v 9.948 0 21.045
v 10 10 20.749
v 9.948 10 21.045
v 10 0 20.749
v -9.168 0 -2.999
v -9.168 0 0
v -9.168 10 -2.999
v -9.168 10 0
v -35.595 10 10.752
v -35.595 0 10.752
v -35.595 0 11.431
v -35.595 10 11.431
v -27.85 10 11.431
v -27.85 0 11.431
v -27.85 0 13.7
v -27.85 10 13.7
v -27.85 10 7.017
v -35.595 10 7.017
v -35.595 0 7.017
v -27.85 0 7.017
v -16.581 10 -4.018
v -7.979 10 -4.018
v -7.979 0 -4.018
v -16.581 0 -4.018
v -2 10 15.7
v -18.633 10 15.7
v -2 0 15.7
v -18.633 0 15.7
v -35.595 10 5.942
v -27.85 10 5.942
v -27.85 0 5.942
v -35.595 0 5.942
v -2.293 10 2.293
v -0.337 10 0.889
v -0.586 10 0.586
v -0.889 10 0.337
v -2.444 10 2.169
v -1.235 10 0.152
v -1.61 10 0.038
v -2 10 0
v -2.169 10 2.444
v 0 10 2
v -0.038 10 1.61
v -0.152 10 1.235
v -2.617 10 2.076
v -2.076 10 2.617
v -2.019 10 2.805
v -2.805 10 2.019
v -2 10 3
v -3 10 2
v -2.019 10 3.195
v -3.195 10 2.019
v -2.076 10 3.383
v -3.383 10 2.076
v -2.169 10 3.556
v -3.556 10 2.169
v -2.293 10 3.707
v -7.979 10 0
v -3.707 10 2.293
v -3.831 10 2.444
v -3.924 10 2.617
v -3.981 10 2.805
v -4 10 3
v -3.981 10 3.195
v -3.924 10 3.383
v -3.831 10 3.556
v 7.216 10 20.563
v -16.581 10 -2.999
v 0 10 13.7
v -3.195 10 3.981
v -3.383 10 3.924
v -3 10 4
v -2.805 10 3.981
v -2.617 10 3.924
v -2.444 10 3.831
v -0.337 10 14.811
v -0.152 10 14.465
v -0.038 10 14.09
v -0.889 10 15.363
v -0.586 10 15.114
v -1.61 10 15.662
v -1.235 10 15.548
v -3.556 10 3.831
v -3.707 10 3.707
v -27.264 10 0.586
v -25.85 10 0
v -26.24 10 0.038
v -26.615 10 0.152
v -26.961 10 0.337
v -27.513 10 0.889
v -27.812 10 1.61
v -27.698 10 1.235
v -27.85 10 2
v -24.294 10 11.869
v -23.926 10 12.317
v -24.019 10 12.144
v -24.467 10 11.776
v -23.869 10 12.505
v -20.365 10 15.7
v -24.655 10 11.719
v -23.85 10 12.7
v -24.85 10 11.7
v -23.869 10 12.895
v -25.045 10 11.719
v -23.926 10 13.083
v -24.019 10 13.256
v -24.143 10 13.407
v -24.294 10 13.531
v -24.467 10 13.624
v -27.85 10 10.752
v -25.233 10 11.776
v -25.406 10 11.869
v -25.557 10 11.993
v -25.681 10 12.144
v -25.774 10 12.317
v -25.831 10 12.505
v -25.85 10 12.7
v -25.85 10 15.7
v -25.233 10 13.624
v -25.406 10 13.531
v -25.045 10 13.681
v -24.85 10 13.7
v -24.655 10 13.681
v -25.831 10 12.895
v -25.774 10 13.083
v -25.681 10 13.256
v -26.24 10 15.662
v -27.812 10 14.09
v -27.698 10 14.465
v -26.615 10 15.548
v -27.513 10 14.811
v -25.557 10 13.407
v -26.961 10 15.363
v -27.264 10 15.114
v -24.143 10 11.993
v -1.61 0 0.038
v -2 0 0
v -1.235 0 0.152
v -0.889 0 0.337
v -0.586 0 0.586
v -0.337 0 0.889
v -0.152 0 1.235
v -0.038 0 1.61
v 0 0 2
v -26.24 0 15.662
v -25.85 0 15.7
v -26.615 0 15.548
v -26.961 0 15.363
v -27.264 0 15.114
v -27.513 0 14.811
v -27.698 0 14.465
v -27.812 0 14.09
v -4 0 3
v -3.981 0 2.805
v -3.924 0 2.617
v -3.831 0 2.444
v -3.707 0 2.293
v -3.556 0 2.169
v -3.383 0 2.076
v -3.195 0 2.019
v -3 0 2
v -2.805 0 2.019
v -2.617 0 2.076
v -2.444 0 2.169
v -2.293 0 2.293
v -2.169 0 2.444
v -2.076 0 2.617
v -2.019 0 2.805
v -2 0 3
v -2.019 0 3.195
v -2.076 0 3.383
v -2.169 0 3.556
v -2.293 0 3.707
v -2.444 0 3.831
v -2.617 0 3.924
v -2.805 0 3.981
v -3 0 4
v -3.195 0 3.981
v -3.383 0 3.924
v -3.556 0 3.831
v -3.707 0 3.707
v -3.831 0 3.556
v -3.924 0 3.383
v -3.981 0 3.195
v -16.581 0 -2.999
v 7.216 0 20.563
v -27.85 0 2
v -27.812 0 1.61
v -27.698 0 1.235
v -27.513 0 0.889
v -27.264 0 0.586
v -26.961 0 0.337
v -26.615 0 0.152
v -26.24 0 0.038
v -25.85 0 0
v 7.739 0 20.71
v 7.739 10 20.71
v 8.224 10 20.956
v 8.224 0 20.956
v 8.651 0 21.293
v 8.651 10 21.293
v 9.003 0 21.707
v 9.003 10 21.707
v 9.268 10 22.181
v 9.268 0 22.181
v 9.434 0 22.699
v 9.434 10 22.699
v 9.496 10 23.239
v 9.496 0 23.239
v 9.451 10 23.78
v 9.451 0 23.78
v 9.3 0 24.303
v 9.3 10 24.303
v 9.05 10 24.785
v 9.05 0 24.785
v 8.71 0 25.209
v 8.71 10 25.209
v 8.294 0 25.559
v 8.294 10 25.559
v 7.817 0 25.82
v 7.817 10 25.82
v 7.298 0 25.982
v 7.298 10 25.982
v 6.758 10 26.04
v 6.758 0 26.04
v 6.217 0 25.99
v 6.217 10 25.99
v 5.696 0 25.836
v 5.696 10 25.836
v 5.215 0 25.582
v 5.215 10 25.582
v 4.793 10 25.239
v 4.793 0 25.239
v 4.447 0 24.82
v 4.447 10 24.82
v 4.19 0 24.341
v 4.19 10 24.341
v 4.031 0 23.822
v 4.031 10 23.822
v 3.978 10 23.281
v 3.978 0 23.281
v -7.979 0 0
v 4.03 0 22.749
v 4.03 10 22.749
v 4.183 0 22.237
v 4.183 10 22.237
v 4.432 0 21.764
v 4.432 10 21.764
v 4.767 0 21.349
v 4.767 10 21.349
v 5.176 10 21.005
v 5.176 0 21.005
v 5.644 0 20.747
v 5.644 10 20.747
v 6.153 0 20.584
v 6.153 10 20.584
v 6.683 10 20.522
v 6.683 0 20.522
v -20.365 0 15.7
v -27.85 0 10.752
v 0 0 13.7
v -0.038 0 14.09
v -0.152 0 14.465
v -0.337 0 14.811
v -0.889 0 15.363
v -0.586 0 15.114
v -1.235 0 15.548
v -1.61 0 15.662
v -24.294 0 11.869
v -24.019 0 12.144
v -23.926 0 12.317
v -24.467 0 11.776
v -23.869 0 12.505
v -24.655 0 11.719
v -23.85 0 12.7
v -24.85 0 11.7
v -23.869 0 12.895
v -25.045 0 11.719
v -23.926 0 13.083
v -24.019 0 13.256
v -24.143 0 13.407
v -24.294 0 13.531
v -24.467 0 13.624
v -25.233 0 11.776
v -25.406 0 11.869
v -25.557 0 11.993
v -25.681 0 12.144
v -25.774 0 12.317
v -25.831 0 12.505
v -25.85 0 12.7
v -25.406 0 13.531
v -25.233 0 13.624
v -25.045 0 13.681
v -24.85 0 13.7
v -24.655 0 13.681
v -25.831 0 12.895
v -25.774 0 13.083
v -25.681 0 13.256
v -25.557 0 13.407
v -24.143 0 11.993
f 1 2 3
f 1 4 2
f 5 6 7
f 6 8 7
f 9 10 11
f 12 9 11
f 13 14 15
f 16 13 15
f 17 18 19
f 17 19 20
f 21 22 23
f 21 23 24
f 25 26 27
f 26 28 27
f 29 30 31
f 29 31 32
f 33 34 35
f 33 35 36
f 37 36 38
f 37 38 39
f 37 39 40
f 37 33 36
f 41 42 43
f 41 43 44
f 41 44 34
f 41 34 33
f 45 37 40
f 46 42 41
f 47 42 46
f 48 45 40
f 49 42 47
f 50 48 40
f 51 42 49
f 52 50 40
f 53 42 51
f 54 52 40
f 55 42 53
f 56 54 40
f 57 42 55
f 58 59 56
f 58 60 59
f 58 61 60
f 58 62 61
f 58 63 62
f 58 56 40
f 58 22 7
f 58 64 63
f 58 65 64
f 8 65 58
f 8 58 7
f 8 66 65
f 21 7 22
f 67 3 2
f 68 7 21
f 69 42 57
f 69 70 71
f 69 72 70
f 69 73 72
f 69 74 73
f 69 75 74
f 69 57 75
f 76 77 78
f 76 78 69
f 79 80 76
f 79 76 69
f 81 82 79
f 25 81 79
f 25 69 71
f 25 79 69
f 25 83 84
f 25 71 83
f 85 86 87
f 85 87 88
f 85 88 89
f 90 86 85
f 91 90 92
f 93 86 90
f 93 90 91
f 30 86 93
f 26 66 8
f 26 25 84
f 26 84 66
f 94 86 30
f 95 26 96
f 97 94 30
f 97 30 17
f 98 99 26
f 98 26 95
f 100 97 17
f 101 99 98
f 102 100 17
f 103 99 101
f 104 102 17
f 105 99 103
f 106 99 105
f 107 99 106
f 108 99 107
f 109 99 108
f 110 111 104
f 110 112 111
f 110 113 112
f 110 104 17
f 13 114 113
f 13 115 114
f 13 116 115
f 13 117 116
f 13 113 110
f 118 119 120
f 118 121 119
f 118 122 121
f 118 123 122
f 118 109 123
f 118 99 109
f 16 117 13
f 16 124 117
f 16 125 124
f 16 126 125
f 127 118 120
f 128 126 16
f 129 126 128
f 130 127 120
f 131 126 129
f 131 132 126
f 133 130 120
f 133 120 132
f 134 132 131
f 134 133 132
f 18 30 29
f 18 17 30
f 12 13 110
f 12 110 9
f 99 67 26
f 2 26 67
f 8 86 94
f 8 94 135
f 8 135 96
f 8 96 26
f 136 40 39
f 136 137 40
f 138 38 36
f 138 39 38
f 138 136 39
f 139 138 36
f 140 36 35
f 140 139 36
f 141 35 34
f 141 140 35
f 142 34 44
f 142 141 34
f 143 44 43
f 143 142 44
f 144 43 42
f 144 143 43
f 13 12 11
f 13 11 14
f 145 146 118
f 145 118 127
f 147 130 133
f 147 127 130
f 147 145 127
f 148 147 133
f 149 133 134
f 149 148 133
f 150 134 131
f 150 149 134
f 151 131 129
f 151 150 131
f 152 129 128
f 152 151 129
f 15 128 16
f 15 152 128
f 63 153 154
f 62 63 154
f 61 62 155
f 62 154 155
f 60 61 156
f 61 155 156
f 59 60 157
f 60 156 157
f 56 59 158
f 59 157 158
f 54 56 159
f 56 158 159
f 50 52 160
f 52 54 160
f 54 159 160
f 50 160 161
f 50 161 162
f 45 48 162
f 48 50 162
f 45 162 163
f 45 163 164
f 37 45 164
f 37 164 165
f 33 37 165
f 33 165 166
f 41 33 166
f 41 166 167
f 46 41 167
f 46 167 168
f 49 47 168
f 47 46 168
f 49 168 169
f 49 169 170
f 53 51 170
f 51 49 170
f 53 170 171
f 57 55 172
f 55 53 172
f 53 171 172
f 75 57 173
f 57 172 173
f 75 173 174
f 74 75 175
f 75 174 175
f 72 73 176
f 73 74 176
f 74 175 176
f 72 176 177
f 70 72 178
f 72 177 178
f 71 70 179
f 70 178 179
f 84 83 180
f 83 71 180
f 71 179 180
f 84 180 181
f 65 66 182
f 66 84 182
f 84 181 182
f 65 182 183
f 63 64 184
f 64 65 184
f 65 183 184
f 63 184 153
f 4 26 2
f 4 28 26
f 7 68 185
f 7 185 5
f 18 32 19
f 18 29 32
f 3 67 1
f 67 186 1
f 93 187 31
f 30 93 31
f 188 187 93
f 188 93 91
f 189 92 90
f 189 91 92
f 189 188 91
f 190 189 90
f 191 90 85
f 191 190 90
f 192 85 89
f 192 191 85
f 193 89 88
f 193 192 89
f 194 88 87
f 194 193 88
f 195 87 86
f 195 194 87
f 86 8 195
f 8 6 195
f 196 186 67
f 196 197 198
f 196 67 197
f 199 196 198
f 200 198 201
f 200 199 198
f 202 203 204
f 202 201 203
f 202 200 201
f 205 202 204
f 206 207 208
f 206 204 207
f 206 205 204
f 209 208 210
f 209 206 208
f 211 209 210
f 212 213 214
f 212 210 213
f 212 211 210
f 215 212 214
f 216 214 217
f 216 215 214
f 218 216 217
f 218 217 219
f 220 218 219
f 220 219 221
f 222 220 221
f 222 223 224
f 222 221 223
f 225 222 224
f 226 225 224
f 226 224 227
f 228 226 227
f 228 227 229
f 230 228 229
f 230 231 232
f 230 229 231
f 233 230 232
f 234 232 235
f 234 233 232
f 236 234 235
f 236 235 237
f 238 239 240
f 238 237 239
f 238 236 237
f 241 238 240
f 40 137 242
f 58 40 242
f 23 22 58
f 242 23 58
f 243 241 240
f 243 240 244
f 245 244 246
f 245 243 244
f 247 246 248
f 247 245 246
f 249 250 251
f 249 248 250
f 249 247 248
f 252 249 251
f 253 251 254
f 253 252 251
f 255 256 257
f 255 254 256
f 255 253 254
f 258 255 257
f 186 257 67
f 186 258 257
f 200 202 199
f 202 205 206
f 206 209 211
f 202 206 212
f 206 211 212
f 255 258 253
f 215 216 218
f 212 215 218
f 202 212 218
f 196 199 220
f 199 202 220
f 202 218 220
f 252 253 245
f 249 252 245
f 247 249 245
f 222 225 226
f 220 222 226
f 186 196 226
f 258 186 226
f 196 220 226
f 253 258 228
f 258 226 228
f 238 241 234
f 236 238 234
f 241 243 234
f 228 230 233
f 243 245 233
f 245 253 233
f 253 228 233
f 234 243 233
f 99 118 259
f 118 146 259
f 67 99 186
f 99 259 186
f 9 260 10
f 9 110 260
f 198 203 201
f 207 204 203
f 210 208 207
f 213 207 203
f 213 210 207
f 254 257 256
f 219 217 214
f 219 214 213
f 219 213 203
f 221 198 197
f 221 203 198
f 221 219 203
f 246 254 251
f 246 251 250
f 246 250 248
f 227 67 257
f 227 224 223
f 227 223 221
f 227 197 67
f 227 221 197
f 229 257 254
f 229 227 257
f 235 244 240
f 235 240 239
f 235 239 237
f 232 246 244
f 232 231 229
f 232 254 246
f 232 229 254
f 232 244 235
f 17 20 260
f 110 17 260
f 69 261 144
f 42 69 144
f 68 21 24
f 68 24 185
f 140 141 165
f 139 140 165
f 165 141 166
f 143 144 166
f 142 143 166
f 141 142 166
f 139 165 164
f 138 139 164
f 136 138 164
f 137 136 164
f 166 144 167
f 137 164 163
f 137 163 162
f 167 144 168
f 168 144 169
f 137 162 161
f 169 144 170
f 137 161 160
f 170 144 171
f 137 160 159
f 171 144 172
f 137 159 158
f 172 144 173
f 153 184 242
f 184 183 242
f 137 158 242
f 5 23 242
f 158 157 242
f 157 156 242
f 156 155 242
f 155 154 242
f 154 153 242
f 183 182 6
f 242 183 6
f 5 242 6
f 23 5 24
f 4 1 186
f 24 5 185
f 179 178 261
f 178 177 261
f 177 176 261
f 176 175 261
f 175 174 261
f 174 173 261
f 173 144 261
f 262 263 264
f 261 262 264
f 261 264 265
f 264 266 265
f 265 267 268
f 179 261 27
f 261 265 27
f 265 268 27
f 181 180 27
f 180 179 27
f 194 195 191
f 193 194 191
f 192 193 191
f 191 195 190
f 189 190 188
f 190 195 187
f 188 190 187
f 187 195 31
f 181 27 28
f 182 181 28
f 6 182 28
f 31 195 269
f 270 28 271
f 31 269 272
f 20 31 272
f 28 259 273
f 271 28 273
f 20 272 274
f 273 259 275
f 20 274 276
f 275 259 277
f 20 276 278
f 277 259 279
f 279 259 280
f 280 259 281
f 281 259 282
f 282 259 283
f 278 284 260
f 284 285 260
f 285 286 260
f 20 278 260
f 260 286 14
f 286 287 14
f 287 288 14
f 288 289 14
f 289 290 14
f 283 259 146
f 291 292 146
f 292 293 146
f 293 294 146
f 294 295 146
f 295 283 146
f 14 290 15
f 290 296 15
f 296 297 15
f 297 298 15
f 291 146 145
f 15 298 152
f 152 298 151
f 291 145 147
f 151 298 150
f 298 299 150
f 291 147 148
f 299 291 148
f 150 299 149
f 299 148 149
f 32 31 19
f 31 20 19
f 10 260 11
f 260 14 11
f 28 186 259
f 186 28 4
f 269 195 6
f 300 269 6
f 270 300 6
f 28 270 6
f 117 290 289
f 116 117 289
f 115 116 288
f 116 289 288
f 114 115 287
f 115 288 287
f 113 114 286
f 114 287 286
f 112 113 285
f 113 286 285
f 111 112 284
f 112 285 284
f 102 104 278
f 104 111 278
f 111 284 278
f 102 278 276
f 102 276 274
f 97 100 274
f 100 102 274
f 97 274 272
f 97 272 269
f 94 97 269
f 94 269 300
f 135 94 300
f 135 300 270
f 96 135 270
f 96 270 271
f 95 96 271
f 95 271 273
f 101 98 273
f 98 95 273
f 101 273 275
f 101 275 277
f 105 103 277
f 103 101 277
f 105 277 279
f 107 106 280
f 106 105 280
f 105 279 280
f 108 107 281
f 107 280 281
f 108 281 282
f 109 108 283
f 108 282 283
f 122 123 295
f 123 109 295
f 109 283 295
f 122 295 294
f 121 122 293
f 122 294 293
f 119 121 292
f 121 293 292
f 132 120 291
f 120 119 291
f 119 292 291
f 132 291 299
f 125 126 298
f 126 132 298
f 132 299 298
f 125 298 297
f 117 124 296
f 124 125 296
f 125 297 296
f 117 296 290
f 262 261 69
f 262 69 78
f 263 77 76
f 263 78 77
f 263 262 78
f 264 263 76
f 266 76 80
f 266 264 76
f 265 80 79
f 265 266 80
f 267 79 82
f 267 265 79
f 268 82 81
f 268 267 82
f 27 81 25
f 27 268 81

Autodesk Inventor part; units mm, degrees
ref_plane "YZ Plane" through (0, 0, 0) normal (1, 0, 0) x (0, 1, 0)
ref_plane "XZ Plane" through (0, 0, 0) normal (0, 1, 0) x (-1, 0, 0)
ref_plane "XY Plane" through (0, 0, 0) normal (0, 0, 1) x (1, 0, 0)
sketch "Sketch1" plane through (0, 0, 0) normal (0, 1, 0) x (-1, 0, 0)
  line L0 (2, 0) -> (25.85, 0)
  line L1 (27.85, 2) -> (27.85, 13.7)
  line L2 (25.85, 15.7) -> (2, 15.7)
  line L3 (0, 13.7) -> (0, 2)
  arc A0 (27.85, 13.7) -> (25.85, 15.7) centre (25.85, 13.7) ccw
  arc A1 (25.85, 0) -> (27.85, 2) centre (25.85, 2) ccw
  arc A2 (0, 2) -> (2, 0) centre (2, 2) ccw
  arc A3 (2, 15.7) -> (0, 13.7) centre (2, 13.7) ccw
  line L4 (20.3653, 15.7) -> (-9.9478, 21.045)
  line L5 (18.6331, 15.7) -> (-10, 20.7488)
  line L6 (-10, 20.7488) -> (-9.9478, 21.045)
  circle A4 centre (-6.737, 23.2807) radius 2.7592
  circle A5 centre (24.85, 12.7) radius 1
  circle A6 centre (3, 3) radius 1
  point P0 (0, 0)
  point P1 (27.85, 15.7)
  point P2 (27.85, 0)
  point P3 (0, 15.7)
  dimension "d0" = 27.85
  dimension "d1" = 15.7
  dimension "d2" = 2
  dimension "d5" = 170
  dimension "d6" = 10
  dimension "d7" = 2
  dimension "d8" = 2
  dimension "d9" = 3
  dimension "d10" = 3
  dimension "d11" = 3
  dimension "d12" = 3
extrude "Extrusion1" add sketch "Sketch1" along normal blind 10
sketch "Sketch2" plane through (0, 10, 0) normal (0, 1, 0) x (1, 0, 0)
  line L0 (-27.85, -2) -> (-27.85, -13.7) projected
  line L1 (-35.5947, -11.431) -> (-27.85, -11.431)
  line L2 (-27.85, -11.431) -> (-27.85, -10.752)
  line L3 (-27.85, -10.752) -> (-35.5947, -10.752)
  line L4 (-35.5947, -10.752) -> (-35.5947, -11.431)
  line L5 (-35.5947, -7.0171) -> (-27.85, -7.0171)
  line L6 (-27.85, -7.0171) -> (-27.85, -5.9419)
  line L7 (-27.85, -5.9419) -> (-35.5947, -5.9419)
  line L8 (-35.5947, -5.9419) -> (-35.5947, -7.0171)
  line L9 (-16.5807, 2.9992) -> (-9.1675, 2.9992)
  line L10 (-9.1675, 2.9992) -> (-9.1675, 4.0178)
  line L11 (-9.1675, 4.0178) -> (-16.5807, 4.0178)
  line L12 (-16.5807, 4.0178) -> (-16.5807, 2.9992)
  line L13 (-9.1675, 4.0178) -> (-7.9791, 4.0178)
  line L14 (-7.9791, 4.0178) -> (-7.9791, 0)
  line L15 (-7.9791, 0) -> (-9.1675, 0)
  line L16 (-9.1675, 0) -> (-9.1675, 4.0178)
  point P0 (0, 0)
extrude "Extrusion2" add sketch "Sketch2" against normal up to surface (10 mm away)
properties part number "00_Endstop"
